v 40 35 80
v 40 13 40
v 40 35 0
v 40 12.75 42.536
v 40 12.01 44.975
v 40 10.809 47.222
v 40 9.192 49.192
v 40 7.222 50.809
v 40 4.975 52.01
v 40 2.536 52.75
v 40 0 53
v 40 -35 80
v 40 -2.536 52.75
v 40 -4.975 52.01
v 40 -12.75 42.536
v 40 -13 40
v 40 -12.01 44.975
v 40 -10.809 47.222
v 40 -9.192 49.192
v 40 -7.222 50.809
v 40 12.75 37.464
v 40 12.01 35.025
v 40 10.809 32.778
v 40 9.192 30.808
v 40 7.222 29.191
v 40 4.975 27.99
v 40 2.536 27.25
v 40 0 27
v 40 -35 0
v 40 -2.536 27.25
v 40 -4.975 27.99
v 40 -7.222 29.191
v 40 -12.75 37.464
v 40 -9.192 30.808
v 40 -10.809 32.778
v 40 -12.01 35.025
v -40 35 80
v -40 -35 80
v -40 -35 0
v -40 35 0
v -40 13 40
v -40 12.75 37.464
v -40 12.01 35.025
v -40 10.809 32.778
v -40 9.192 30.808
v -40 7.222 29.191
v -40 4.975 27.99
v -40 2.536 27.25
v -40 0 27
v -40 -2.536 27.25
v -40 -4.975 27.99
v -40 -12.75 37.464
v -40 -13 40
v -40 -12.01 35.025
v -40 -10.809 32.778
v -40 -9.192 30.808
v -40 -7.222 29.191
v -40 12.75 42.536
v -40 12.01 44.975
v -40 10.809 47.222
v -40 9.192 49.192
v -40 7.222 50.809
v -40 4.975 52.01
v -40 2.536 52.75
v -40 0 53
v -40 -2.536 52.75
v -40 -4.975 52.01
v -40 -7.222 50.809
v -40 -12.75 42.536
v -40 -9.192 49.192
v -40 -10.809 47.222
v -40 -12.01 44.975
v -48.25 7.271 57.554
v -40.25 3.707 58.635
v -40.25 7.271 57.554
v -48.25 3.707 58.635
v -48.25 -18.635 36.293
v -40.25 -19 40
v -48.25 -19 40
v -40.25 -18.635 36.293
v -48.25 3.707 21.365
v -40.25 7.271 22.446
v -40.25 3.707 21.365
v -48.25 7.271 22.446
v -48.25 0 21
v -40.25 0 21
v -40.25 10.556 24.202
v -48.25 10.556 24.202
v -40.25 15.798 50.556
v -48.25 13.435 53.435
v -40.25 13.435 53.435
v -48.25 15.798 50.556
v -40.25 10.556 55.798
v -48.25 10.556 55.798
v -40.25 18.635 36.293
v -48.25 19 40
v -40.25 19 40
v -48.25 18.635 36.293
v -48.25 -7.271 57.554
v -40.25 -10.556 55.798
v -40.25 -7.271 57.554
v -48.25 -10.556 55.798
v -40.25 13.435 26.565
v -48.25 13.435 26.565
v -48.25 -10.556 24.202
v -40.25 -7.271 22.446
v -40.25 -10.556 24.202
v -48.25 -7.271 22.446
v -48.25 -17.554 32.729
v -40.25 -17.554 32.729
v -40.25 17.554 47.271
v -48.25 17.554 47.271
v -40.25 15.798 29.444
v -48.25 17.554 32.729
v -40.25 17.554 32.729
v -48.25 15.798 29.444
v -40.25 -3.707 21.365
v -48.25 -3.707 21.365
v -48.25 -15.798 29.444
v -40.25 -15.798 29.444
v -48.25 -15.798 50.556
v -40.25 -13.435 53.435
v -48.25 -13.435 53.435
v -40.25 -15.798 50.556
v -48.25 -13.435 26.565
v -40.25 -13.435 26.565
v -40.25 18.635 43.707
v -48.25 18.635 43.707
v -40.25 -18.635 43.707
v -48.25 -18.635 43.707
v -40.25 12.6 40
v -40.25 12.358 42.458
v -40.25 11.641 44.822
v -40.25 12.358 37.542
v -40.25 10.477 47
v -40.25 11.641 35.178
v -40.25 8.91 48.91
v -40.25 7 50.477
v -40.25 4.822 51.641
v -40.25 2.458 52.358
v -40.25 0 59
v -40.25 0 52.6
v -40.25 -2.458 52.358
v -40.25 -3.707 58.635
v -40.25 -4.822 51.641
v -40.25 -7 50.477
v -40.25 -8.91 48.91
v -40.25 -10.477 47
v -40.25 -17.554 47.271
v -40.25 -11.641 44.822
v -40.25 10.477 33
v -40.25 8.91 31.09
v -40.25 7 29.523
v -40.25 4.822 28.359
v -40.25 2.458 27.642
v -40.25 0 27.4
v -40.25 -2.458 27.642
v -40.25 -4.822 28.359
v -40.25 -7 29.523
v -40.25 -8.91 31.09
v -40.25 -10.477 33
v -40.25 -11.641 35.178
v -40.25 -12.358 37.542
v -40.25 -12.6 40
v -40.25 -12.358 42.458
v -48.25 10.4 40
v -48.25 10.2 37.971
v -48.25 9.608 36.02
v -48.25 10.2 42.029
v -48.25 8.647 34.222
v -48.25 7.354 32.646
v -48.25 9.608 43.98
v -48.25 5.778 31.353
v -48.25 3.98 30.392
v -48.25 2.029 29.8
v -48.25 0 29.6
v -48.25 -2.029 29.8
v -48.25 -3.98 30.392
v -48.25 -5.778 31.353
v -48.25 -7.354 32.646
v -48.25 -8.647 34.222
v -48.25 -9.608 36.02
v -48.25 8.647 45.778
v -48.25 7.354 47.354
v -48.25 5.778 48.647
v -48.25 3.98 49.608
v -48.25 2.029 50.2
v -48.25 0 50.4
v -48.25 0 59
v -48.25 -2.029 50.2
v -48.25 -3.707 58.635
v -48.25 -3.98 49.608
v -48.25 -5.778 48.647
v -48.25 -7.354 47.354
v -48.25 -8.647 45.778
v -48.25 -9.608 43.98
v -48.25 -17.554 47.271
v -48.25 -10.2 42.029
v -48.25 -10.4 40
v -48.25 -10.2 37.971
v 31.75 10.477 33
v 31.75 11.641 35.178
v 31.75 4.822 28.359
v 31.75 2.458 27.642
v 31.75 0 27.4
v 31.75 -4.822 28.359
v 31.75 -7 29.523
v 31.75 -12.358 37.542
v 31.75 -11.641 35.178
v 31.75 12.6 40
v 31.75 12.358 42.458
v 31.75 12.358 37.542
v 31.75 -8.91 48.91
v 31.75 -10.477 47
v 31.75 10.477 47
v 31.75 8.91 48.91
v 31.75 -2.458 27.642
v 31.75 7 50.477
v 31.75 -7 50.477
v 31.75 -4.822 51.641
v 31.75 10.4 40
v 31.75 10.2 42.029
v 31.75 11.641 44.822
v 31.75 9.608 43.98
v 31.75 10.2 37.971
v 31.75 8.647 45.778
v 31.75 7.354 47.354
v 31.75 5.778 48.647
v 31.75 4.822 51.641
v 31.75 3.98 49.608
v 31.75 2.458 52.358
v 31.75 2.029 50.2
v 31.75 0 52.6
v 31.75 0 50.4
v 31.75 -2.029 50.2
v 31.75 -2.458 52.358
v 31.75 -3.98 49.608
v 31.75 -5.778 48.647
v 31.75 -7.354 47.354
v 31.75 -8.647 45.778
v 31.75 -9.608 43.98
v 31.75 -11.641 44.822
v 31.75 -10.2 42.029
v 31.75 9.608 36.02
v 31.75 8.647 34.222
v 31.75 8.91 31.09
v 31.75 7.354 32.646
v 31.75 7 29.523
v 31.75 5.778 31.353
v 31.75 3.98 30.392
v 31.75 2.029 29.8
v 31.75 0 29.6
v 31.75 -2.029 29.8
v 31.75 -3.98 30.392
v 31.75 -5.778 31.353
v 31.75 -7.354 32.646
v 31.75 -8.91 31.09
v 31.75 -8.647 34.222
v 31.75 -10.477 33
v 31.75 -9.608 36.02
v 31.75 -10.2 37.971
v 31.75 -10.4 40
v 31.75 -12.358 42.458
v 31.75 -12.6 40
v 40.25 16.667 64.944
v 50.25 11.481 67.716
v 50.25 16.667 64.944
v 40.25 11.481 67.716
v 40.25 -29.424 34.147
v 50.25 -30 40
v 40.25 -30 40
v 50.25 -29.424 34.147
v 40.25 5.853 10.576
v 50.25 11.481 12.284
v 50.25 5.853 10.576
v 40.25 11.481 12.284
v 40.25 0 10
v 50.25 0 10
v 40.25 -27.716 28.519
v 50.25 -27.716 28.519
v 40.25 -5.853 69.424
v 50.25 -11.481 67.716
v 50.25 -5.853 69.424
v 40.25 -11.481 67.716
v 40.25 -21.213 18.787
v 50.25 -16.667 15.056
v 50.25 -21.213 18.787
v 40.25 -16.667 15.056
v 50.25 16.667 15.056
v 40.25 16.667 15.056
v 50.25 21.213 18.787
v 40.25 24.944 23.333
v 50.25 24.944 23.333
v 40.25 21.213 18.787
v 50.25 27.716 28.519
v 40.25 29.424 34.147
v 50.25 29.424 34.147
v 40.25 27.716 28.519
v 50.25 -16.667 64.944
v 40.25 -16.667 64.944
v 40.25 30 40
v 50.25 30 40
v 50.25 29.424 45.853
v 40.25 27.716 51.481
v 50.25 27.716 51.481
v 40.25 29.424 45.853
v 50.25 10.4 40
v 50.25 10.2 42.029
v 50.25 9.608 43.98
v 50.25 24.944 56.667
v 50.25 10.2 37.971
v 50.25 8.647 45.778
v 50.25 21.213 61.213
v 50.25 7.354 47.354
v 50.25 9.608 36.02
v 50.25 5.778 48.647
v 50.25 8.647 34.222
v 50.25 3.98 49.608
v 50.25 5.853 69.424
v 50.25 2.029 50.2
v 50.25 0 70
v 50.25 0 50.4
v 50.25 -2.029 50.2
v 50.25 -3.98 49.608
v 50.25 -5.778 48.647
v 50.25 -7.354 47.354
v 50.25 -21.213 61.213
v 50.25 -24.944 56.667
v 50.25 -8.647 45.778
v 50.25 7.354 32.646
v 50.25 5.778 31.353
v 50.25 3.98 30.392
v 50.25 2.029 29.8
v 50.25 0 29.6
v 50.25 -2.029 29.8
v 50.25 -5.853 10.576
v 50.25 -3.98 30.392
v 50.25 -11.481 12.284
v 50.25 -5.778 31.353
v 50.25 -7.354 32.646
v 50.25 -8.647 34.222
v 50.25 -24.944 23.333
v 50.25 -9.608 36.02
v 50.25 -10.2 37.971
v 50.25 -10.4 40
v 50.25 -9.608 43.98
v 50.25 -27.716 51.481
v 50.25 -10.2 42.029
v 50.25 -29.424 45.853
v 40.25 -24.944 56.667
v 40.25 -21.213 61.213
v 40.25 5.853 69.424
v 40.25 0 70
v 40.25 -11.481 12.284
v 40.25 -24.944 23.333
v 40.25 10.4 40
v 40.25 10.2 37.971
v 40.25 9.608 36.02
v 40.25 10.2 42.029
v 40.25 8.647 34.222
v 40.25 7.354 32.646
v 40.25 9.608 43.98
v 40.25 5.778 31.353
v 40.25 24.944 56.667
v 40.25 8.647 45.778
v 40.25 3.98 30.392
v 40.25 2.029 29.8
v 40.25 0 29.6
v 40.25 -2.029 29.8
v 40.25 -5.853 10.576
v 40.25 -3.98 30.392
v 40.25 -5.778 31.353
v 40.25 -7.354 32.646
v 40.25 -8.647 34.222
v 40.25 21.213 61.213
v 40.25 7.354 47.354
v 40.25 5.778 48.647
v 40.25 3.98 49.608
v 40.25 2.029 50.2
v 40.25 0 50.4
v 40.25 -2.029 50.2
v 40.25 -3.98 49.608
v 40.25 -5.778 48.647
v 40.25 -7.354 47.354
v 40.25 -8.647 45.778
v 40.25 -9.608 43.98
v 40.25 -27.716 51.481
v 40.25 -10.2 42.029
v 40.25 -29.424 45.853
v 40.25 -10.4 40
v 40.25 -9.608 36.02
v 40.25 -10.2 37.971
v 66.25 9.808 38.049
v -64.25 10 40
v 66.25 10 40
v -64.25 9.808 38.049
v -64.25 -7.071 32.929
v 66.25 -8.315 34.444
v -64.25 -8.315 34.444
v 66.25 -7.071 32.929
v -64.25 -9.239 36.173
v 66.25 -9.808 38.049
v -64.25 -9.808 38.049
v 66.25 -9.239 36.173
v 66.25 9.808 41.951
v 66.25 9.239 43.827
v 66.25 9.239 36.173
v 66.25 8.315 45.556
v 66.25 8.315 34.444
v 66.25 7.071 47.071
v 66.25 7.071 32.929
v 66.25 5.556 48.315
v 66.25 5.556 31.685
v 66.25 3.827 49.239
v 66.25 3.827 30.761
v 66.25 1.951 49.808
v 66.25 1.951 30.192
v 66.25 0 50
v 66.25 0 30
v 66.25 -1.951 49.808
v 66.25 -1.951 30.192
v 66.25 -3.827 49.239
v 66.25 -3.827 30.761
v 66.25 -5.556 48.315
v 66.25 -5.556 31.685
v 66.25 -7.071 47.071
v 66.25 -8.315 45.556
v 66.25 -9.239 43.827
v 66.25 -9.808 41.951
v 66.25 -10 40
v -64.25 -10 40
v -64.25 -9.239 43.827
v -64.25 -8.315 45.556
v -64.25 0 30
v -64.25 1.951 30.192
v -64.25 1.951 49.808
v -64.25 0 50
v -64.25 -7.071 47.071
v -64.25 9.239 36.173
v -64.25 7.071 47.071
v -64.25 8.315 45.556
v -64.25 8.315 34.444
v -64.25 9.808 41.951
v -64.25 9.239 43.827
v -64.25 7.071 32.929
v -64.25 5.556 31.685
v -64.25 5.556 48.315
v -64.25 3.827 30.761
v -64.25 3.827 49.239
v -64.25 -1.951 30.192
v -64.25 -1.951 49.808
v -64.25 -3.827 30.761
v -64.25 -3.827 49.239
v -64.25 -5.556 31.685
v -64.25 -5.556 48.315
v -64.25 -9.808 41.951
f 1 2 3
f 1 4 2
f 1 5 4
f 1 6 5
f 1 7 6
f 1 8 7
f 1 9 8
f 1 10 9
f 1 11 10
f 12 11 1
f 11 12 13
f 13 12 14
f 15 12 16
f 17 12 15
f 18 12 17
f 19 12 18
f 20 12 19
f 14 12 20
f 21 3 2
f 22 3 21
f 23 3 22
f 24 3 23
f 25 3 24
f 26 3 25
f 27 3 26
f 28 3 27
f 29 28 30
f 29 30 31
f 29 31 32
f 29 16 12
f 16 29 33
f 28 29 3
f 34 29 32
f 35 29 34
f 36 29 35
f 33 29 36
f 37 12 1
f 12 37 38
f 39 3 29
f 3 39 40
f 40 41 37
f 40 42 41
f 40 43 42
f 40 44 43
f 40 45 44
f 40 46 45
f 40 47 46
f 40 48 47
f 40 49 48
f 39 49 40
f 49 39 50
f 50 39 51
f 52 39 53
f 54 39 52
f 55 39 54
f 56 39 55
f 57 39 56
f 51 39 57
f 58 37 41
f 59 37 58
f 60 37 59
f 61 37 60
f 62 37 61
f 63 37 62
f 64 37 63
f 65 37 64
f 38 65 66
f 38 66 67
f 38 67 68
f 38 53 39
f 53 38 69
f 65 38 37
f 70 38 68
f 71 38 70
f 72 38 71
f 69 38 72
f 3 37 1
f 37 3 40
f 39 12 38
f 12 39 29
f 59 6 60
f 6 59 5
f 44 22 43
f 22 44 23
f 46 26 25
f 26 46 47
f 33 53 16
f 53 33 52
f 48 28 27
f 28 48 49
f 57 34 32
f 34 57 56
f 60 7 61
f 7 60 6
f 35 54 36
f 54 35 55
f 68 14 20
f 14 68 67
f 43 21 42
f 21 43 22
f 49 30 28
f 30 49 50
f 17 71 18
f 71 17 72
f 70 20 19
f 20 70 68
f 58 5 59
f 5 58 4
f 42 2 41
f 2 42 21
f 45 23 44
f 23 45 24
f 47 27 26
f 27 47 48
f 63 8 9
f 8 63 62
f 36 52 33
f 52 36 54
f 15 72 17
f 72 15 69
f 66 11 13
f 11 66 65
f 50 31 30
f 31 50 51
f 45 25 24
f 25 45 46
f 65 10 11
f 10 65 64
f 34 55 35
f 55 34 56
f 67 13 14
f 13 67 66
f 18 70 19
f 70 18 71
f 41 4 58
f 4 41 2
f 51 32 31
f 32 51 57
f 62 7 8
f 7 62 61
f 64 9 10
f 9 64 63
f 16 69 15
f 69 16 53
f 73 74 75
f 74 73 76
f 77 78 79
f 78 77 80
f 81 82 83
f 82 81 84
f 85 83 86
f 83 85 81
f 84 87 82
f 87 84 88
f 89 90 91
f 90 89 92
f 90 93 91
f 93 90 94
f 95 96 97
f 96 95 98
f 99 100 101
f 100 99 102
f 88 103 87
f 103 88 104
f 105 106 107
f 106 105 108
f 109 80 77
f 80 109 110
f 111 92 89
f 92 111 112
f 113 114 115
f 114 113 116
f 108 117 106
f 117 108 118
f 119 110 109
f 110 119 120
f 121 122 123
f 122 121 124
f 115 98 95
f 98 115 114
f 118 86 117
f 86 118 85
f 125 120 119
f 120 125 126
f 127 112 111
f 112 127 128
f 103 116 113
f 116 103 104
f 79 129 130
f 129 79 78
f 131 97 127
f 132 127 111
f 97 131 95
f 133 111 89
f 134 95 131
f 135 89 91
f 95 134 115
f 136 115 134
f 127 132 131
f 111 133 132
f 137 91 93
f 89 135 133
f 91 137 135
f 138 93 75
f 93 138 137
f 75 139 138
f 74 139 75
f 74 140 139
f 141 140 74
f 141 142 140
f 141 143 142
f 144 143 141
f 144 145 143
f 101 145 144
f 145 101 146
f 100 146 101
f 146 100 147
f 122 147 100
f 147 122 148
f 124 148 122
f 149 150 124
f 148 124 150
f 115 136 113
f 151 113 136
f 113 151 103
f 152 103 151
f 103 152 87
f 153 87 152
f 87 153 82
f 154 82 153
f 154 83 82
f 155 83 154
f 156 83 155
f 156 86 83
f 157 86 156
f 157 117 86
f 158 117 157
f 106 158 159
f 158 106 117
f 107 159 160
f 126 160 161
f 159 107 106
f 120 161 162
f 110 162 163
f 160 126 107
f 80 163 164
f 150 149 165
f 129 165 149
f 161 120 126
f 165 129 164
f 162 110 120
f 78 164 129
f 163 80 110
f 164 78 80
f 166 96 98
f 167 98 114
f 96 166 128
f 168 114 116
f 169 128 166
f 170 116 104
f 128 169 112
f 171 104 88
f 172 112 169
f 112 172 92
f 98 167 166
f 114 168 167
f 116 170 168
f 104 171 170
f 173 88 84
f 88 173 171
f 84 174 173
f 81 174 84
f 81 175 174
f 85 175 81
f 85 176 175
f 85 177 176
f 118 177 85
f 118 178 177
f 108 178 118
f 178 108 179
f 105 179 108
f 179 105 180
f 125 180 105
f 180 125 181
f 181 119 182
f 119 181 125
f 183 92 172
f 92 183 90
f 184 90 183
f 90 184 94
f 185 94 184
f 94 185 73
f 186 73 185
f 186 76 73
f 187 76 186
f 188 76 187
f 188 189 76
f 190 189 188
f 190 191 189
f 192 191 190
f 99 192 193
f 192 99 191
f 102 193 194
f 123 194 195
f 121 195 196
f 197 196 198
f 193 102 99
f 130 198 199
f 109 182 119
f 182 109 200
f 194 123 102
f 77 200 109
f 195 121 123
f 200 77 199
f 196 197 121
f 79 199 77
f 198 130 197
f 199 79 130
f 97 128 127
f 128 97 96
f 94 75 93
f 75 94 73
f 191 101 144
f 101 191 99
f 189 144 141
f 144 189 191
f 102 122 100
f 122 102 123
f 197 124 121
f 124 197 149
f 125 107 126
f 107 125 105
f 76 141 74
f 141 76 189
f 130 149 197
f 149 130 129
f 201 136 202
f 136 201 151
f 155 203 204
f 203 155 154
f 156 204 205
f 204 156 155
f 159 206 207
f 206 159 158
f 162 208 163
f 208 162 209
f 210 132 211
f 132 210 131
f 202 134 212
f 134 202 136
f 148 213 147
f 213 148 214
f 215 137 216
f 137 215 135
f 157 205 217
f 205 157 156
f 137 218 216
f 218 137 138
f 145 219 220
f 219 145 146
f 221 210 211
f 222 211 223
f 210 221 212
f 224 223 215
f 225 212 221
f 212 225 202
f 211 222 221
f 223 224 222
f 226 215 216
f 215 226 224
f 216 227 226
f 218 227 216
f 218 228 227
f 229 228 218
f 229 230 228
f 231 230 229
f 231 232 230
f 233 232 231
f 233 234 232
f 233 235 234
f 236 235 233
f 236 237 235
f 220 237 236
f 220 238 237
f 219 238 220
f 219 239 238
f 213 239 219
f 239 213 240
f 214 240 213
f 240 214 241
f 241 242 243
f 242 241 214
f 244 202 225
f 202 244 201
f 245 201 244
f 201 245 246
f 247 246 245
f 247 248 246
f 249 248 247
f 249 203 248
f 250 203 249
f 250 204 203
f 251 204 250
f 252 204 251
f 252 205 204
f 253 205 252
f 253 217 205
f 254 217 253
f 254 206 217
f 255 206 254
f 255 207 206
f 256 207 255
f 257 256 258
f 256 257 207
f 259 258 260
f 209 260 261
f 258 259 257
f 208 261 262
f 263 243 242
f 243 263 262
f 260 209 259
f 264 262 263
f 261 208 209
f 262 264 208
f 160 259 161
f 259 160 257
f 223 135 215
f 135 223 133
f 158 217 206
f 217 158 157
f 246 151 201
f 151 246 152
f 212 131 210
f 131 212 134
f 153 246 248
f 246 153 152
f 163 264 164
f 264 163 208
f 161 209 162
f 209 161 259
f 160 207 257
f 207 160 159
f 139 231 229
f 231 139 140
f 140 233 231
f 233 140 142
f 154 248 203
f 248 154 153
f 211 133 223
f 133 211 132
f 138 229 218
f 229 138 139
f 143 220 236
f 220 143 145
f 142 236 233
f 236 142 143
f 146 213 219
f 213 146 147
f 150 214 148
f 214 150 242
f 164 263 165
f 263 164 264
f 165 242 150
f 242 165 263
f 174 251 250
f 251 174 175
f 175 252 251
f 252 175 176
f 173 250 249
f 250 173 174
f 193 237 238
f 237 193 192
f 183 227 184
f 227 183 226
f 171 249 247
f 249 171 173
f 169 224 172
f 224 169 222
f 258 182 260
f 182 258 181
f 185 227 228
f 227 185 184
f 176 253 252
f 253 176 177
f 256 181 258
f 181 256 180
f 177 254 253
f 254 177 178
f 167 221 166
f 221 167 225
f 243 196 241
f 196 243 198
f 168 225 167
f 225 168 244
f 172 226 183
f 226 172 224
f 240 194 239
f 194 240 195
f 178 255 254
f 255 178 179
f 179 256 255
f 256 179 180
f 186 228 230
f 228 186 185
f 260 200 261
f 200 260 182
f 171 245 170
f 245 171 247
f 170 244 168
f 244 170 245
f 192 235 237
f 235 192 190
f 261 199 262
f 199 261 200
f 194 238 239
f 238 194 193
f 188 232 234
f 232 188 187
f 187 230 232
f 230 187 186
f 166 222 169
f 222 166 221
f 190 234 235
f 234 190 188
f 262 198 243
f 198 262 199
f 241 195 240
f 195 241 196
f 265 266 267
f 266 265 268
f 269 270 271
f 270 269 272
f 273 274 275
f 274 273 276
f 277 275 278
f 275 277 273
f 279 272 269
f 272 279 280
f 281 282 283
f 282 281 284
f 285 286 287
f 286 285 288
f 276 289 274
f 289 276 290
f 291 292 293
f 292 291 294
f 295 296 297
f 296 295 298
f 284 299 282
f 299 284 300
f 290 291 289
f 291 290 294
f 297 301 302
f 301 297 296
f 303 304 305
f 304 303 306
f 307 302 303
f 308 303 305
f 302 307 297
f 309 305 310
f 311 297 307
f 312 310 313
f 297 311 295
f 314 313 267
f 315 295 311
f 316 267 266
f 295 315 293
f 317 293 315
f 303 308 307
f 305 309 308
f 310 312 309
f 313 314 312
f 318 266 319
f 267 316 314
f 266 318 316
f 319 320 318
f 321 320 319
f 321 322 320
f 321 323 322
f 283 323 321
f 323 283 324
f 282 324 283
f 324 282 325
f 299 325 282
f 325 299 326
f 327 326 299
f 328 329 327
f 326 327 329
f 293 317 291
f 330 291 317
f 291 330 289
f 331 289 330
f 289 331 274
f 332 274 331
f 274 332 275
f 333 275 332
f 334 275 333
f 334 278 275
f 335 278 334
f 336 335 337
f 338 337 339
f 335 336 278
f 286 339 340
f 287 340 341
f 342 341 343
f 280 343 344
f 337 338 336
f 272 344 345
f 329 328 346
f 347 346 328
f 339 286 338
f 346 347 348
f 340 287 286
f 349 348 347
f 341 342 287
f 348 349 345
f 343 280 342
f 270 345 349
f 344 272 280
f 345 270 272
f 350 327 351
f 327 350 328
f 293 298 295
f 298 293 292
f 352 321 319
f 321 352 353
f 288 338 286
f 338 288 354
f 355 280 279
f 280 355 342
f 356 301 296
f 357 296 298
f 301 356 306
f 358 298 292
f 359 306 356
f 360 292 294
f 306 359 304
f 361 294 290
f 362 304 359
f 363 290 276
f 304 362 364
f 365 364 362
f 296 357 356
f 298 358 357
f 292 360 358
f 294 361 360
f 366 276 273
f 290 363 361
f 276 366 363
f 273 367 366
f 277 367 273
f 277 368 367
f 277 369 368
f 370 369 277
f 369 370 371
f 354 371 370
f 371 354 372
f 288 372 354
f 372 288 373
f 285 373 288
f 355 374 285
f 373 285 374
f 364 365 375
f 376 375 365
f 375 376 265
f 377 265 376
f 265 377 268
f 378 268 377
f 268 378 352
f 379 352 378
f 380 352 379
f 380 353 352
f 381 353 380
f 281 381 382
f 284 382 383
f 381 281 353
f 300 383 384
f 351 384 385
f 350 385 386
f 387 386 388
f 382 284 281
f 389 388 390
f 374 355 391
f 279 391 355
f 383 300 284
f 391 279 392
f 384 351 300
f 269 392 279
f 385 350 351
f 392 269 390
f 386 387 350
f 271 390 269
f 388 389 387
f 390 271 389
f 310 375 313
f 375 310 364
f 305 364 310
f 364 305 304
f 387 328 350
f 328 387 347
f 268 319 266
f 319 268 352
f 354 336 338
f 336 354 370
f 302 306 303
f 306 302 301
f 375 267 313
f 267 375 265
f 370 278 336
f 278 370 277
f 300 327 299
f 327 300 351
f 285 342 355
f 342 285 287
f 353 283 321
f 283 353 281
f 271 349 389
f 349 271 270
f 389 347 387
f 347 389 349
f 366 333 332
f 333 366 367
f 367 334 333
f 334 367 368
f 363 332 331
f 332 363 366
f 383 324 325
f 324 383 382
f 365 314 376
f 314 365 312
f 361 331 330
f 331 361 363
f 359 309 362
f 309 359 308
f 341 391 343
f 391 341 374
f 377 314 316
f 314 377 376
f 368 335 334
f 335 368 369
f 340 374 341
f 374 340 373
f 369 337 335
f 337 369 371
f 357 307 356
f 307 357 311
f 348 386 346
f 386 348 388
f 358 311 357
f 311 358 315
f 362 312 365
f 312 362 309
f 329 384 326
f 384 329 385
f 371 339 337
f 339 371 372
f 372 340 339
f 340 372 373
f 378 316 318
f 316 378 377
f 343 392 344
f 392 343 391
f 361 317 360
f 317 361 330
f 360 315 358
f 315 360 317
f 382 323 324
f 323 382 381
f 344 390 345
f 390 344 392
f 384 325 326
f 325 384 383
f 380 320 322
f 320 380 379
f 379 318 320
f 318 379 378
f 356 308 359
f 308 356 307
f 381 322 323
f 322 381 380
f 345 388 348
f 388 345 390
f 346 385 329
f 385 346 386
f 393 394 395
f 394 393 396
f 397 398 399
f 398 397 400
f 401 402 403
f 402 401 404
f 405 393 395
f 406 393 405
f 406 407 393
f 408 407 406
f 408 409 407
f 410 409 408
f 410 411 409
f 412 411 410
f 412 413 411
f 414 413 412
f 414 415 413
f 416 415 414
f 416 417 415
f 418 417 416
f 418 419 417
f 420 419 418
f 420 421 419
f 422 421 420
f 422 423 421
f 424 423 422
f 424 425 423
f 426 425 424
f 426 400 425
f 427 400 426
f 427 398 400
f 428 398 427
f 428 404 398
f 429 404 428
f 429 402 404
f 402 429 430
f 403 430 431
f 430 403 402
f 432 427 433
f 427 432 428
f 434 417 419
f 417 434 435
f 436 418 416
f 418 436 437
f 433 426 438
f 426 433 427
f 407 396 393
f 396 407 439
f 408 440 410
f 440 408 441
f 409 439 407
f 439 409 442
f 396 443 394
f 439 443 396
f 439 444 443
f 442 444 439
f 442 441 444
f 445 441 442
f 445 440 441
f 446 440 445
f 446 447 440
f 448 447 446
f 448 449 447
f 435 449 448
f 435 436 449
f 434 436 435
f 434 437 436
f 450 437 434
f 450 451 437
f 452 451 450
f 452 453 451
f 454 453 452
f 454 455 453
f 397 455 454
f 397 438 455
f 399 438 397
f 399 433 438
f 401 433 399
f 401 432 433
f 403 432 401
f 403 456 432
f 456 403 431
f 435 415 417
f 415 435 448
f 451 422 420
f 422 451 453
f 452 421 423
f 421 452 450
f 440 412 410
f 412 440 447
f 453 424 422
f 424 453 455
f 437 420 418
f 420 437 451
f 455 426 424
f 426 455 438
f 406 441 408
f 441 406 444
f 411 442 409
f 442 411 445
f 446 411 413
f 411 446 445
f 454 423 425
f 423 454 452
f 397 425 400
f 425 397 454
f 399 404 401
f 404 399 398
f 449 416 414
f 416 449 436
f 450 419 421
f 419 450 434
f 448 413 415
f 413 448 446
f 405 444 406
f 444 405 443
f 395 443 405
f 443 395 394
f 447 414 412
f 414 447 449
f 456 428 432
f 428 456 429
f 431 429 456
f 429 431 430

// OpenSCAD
$fn = 32;

// ------------------------------------------------------------------------
// Bushed housing: 80 x 70 x 80 mm housing, bushing d25.2
// Every part is its own module, assembly() places them once.
// ------------------------------------------------------------------------

// --- part 1 ---
module housing() {
  difference() {
    translate([-40, -35, 0]) cube([80, 70, 80]);
    translate([0, 0, 40]) rotate([0, 90, 0]) cylinder(h = 82, d = 26, center = true);
  }
}

// --- part 2 ---
module bushing() {
  difference() {
    union() {
      cylinder(h = 8, d = 38);
      translate([0, 0, 8]) cylinder(h = 72, d = 25.2);
    }
    translate([0, 0, -1]) cylinder(h = 82, d = 20.8);
  }
}

// --- part 3 ---
module shaft() {
  translate([0, 0, -65.25]) cylinder(h = 130.5, d = 20);
}

// --- part 4 ---
module cover() {
  difference() {
    cylinder(h = 10, d = 60);
    translate([0, 0, -1]) cylinder(h = 12, d = 20.8);
  }
}

// --- assembly ---
module assembly() {
  translate([0, 0, 0]) rotate([0, 0, 0]) housing();
  translate([-48.25, 0, 40]) rotate([0, 90, 0]) bushing();
  translate([1, 0, 40]) rotate([0, 90, 0]) shaft();
  translate([40.25, 0, 40]) rotate([0, 90, 0]) cover();
}

assembly();
